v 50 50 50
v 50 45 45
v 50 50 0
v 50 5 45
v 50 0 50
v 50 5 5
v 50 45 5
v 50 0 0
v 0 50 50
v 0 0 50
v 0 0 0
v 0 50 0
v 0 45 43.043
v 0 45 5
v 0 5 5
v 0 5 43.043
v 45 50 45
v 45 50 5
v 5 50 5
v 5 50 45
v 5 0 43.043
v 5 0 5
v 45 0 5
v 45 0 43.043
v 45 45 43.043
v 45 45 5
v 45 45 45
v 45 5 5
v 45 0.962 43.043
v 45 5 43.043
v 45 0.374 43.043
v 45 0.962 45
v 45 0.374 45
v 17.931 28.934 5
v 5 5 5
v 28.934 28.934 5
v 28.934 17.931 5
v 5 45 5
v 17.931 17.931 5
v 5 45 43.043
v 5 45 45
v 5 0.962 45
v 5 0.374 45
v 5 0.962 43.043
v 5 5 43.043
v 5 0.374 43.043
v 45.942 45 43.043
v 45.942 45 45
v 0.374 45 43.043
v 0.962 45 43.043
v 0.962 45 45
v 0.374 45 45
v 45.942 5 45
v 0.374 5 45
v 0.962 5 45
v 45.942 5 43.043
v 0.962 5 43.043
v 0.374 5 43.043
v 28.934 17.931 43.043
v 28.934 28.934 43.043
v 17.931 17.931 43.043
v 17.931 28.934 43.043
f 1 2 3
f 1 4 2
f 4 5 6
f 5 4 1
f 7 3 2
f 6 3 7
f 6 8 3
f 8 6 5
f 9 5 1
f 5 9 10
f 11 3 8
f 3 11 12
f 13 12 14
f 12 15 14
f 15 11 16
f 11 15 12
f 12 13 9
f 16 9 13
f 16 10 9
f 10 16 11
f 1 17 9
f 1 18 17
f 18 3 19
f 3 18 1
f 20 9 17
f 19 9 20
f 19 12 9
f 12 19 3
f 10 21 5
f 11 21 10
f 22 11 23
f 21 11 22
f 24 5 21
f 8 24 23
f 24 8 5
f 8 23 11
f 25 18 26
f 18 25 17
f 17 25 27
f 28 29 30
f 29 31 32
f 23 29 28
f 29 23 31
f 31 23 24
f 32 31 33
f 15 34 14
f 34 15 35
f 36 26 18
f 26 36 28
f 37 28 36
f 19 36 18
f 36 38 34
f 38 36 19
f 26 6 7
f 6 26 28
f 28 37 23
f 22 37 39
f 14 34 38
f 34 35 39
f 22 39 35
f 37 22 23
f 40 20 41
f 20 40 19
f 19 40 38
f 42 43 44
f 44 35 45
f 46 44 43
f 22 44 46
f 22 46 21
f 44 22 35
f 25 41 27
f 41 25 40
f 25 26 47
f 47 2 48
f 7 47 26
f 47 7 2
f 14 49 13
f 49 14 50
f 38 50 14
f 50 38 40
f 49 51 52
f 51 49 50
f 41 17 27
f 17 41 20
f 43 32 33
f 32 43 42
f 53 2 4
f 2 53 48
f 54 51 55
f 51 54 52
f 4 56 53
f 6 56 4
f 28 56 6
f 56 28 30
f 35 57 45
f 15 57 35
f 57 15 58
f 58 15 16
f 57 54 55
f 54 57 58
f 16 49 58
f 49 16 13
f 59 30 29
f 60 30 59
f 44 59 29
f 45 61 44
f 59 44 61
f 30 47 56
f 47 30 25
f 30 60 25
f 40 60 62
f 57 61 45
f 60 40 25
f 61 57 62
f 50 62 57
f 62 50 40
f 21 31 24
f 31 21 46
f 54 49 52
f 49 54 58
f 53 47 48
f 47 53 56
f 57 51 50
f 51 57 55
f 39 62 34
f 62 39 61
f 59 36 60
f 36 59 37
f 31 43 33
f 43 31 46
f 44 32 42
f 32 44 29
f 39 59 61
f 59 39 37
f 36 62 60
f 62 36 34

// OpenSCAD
cube_size=50;
edge_width=5;
sc_x=5.5;
sc_y=5.;

ex=55;
letters=["LETTER1","LETTER2"];

$fn=100;
union() {
    // Exterior box
    difference() {
        cube([cube_size,cube_size,cube_size]);
        translate([edge_width, edge_width, edge_width]) 
            cube([cube_size-edge_width*2,cube_size-edge_width*2, cube_size]);
        translate([edge_width, 0, edge_width]) 
            cube([cube_size-edge_width*2,cube_size, cube_size-edge_width*2]);
        translate([0, edge_width, edge_width]) 
            cube([cube_size,cube_size-edge_width*2, cube_size-edge_width*2]);
    };

    intersection() {    
        cube([cube_size,cube_size,cube_size]);
        translate([25,45,3]) rotate([90,0,0]) scale([sc_x,sc_y,1]) linear_extrude(ex) 
            text(letters[0], halign="center", font = "Liberation Sans:style=Bold");
        translate([0,25,3]) rotate([90,0,90]) scale([sc_x,sc_y,1]) linear_extrude(ex) 
            text(letters[1], halign="center", font = "Liberation Sans:style=Bold");

    }
}
